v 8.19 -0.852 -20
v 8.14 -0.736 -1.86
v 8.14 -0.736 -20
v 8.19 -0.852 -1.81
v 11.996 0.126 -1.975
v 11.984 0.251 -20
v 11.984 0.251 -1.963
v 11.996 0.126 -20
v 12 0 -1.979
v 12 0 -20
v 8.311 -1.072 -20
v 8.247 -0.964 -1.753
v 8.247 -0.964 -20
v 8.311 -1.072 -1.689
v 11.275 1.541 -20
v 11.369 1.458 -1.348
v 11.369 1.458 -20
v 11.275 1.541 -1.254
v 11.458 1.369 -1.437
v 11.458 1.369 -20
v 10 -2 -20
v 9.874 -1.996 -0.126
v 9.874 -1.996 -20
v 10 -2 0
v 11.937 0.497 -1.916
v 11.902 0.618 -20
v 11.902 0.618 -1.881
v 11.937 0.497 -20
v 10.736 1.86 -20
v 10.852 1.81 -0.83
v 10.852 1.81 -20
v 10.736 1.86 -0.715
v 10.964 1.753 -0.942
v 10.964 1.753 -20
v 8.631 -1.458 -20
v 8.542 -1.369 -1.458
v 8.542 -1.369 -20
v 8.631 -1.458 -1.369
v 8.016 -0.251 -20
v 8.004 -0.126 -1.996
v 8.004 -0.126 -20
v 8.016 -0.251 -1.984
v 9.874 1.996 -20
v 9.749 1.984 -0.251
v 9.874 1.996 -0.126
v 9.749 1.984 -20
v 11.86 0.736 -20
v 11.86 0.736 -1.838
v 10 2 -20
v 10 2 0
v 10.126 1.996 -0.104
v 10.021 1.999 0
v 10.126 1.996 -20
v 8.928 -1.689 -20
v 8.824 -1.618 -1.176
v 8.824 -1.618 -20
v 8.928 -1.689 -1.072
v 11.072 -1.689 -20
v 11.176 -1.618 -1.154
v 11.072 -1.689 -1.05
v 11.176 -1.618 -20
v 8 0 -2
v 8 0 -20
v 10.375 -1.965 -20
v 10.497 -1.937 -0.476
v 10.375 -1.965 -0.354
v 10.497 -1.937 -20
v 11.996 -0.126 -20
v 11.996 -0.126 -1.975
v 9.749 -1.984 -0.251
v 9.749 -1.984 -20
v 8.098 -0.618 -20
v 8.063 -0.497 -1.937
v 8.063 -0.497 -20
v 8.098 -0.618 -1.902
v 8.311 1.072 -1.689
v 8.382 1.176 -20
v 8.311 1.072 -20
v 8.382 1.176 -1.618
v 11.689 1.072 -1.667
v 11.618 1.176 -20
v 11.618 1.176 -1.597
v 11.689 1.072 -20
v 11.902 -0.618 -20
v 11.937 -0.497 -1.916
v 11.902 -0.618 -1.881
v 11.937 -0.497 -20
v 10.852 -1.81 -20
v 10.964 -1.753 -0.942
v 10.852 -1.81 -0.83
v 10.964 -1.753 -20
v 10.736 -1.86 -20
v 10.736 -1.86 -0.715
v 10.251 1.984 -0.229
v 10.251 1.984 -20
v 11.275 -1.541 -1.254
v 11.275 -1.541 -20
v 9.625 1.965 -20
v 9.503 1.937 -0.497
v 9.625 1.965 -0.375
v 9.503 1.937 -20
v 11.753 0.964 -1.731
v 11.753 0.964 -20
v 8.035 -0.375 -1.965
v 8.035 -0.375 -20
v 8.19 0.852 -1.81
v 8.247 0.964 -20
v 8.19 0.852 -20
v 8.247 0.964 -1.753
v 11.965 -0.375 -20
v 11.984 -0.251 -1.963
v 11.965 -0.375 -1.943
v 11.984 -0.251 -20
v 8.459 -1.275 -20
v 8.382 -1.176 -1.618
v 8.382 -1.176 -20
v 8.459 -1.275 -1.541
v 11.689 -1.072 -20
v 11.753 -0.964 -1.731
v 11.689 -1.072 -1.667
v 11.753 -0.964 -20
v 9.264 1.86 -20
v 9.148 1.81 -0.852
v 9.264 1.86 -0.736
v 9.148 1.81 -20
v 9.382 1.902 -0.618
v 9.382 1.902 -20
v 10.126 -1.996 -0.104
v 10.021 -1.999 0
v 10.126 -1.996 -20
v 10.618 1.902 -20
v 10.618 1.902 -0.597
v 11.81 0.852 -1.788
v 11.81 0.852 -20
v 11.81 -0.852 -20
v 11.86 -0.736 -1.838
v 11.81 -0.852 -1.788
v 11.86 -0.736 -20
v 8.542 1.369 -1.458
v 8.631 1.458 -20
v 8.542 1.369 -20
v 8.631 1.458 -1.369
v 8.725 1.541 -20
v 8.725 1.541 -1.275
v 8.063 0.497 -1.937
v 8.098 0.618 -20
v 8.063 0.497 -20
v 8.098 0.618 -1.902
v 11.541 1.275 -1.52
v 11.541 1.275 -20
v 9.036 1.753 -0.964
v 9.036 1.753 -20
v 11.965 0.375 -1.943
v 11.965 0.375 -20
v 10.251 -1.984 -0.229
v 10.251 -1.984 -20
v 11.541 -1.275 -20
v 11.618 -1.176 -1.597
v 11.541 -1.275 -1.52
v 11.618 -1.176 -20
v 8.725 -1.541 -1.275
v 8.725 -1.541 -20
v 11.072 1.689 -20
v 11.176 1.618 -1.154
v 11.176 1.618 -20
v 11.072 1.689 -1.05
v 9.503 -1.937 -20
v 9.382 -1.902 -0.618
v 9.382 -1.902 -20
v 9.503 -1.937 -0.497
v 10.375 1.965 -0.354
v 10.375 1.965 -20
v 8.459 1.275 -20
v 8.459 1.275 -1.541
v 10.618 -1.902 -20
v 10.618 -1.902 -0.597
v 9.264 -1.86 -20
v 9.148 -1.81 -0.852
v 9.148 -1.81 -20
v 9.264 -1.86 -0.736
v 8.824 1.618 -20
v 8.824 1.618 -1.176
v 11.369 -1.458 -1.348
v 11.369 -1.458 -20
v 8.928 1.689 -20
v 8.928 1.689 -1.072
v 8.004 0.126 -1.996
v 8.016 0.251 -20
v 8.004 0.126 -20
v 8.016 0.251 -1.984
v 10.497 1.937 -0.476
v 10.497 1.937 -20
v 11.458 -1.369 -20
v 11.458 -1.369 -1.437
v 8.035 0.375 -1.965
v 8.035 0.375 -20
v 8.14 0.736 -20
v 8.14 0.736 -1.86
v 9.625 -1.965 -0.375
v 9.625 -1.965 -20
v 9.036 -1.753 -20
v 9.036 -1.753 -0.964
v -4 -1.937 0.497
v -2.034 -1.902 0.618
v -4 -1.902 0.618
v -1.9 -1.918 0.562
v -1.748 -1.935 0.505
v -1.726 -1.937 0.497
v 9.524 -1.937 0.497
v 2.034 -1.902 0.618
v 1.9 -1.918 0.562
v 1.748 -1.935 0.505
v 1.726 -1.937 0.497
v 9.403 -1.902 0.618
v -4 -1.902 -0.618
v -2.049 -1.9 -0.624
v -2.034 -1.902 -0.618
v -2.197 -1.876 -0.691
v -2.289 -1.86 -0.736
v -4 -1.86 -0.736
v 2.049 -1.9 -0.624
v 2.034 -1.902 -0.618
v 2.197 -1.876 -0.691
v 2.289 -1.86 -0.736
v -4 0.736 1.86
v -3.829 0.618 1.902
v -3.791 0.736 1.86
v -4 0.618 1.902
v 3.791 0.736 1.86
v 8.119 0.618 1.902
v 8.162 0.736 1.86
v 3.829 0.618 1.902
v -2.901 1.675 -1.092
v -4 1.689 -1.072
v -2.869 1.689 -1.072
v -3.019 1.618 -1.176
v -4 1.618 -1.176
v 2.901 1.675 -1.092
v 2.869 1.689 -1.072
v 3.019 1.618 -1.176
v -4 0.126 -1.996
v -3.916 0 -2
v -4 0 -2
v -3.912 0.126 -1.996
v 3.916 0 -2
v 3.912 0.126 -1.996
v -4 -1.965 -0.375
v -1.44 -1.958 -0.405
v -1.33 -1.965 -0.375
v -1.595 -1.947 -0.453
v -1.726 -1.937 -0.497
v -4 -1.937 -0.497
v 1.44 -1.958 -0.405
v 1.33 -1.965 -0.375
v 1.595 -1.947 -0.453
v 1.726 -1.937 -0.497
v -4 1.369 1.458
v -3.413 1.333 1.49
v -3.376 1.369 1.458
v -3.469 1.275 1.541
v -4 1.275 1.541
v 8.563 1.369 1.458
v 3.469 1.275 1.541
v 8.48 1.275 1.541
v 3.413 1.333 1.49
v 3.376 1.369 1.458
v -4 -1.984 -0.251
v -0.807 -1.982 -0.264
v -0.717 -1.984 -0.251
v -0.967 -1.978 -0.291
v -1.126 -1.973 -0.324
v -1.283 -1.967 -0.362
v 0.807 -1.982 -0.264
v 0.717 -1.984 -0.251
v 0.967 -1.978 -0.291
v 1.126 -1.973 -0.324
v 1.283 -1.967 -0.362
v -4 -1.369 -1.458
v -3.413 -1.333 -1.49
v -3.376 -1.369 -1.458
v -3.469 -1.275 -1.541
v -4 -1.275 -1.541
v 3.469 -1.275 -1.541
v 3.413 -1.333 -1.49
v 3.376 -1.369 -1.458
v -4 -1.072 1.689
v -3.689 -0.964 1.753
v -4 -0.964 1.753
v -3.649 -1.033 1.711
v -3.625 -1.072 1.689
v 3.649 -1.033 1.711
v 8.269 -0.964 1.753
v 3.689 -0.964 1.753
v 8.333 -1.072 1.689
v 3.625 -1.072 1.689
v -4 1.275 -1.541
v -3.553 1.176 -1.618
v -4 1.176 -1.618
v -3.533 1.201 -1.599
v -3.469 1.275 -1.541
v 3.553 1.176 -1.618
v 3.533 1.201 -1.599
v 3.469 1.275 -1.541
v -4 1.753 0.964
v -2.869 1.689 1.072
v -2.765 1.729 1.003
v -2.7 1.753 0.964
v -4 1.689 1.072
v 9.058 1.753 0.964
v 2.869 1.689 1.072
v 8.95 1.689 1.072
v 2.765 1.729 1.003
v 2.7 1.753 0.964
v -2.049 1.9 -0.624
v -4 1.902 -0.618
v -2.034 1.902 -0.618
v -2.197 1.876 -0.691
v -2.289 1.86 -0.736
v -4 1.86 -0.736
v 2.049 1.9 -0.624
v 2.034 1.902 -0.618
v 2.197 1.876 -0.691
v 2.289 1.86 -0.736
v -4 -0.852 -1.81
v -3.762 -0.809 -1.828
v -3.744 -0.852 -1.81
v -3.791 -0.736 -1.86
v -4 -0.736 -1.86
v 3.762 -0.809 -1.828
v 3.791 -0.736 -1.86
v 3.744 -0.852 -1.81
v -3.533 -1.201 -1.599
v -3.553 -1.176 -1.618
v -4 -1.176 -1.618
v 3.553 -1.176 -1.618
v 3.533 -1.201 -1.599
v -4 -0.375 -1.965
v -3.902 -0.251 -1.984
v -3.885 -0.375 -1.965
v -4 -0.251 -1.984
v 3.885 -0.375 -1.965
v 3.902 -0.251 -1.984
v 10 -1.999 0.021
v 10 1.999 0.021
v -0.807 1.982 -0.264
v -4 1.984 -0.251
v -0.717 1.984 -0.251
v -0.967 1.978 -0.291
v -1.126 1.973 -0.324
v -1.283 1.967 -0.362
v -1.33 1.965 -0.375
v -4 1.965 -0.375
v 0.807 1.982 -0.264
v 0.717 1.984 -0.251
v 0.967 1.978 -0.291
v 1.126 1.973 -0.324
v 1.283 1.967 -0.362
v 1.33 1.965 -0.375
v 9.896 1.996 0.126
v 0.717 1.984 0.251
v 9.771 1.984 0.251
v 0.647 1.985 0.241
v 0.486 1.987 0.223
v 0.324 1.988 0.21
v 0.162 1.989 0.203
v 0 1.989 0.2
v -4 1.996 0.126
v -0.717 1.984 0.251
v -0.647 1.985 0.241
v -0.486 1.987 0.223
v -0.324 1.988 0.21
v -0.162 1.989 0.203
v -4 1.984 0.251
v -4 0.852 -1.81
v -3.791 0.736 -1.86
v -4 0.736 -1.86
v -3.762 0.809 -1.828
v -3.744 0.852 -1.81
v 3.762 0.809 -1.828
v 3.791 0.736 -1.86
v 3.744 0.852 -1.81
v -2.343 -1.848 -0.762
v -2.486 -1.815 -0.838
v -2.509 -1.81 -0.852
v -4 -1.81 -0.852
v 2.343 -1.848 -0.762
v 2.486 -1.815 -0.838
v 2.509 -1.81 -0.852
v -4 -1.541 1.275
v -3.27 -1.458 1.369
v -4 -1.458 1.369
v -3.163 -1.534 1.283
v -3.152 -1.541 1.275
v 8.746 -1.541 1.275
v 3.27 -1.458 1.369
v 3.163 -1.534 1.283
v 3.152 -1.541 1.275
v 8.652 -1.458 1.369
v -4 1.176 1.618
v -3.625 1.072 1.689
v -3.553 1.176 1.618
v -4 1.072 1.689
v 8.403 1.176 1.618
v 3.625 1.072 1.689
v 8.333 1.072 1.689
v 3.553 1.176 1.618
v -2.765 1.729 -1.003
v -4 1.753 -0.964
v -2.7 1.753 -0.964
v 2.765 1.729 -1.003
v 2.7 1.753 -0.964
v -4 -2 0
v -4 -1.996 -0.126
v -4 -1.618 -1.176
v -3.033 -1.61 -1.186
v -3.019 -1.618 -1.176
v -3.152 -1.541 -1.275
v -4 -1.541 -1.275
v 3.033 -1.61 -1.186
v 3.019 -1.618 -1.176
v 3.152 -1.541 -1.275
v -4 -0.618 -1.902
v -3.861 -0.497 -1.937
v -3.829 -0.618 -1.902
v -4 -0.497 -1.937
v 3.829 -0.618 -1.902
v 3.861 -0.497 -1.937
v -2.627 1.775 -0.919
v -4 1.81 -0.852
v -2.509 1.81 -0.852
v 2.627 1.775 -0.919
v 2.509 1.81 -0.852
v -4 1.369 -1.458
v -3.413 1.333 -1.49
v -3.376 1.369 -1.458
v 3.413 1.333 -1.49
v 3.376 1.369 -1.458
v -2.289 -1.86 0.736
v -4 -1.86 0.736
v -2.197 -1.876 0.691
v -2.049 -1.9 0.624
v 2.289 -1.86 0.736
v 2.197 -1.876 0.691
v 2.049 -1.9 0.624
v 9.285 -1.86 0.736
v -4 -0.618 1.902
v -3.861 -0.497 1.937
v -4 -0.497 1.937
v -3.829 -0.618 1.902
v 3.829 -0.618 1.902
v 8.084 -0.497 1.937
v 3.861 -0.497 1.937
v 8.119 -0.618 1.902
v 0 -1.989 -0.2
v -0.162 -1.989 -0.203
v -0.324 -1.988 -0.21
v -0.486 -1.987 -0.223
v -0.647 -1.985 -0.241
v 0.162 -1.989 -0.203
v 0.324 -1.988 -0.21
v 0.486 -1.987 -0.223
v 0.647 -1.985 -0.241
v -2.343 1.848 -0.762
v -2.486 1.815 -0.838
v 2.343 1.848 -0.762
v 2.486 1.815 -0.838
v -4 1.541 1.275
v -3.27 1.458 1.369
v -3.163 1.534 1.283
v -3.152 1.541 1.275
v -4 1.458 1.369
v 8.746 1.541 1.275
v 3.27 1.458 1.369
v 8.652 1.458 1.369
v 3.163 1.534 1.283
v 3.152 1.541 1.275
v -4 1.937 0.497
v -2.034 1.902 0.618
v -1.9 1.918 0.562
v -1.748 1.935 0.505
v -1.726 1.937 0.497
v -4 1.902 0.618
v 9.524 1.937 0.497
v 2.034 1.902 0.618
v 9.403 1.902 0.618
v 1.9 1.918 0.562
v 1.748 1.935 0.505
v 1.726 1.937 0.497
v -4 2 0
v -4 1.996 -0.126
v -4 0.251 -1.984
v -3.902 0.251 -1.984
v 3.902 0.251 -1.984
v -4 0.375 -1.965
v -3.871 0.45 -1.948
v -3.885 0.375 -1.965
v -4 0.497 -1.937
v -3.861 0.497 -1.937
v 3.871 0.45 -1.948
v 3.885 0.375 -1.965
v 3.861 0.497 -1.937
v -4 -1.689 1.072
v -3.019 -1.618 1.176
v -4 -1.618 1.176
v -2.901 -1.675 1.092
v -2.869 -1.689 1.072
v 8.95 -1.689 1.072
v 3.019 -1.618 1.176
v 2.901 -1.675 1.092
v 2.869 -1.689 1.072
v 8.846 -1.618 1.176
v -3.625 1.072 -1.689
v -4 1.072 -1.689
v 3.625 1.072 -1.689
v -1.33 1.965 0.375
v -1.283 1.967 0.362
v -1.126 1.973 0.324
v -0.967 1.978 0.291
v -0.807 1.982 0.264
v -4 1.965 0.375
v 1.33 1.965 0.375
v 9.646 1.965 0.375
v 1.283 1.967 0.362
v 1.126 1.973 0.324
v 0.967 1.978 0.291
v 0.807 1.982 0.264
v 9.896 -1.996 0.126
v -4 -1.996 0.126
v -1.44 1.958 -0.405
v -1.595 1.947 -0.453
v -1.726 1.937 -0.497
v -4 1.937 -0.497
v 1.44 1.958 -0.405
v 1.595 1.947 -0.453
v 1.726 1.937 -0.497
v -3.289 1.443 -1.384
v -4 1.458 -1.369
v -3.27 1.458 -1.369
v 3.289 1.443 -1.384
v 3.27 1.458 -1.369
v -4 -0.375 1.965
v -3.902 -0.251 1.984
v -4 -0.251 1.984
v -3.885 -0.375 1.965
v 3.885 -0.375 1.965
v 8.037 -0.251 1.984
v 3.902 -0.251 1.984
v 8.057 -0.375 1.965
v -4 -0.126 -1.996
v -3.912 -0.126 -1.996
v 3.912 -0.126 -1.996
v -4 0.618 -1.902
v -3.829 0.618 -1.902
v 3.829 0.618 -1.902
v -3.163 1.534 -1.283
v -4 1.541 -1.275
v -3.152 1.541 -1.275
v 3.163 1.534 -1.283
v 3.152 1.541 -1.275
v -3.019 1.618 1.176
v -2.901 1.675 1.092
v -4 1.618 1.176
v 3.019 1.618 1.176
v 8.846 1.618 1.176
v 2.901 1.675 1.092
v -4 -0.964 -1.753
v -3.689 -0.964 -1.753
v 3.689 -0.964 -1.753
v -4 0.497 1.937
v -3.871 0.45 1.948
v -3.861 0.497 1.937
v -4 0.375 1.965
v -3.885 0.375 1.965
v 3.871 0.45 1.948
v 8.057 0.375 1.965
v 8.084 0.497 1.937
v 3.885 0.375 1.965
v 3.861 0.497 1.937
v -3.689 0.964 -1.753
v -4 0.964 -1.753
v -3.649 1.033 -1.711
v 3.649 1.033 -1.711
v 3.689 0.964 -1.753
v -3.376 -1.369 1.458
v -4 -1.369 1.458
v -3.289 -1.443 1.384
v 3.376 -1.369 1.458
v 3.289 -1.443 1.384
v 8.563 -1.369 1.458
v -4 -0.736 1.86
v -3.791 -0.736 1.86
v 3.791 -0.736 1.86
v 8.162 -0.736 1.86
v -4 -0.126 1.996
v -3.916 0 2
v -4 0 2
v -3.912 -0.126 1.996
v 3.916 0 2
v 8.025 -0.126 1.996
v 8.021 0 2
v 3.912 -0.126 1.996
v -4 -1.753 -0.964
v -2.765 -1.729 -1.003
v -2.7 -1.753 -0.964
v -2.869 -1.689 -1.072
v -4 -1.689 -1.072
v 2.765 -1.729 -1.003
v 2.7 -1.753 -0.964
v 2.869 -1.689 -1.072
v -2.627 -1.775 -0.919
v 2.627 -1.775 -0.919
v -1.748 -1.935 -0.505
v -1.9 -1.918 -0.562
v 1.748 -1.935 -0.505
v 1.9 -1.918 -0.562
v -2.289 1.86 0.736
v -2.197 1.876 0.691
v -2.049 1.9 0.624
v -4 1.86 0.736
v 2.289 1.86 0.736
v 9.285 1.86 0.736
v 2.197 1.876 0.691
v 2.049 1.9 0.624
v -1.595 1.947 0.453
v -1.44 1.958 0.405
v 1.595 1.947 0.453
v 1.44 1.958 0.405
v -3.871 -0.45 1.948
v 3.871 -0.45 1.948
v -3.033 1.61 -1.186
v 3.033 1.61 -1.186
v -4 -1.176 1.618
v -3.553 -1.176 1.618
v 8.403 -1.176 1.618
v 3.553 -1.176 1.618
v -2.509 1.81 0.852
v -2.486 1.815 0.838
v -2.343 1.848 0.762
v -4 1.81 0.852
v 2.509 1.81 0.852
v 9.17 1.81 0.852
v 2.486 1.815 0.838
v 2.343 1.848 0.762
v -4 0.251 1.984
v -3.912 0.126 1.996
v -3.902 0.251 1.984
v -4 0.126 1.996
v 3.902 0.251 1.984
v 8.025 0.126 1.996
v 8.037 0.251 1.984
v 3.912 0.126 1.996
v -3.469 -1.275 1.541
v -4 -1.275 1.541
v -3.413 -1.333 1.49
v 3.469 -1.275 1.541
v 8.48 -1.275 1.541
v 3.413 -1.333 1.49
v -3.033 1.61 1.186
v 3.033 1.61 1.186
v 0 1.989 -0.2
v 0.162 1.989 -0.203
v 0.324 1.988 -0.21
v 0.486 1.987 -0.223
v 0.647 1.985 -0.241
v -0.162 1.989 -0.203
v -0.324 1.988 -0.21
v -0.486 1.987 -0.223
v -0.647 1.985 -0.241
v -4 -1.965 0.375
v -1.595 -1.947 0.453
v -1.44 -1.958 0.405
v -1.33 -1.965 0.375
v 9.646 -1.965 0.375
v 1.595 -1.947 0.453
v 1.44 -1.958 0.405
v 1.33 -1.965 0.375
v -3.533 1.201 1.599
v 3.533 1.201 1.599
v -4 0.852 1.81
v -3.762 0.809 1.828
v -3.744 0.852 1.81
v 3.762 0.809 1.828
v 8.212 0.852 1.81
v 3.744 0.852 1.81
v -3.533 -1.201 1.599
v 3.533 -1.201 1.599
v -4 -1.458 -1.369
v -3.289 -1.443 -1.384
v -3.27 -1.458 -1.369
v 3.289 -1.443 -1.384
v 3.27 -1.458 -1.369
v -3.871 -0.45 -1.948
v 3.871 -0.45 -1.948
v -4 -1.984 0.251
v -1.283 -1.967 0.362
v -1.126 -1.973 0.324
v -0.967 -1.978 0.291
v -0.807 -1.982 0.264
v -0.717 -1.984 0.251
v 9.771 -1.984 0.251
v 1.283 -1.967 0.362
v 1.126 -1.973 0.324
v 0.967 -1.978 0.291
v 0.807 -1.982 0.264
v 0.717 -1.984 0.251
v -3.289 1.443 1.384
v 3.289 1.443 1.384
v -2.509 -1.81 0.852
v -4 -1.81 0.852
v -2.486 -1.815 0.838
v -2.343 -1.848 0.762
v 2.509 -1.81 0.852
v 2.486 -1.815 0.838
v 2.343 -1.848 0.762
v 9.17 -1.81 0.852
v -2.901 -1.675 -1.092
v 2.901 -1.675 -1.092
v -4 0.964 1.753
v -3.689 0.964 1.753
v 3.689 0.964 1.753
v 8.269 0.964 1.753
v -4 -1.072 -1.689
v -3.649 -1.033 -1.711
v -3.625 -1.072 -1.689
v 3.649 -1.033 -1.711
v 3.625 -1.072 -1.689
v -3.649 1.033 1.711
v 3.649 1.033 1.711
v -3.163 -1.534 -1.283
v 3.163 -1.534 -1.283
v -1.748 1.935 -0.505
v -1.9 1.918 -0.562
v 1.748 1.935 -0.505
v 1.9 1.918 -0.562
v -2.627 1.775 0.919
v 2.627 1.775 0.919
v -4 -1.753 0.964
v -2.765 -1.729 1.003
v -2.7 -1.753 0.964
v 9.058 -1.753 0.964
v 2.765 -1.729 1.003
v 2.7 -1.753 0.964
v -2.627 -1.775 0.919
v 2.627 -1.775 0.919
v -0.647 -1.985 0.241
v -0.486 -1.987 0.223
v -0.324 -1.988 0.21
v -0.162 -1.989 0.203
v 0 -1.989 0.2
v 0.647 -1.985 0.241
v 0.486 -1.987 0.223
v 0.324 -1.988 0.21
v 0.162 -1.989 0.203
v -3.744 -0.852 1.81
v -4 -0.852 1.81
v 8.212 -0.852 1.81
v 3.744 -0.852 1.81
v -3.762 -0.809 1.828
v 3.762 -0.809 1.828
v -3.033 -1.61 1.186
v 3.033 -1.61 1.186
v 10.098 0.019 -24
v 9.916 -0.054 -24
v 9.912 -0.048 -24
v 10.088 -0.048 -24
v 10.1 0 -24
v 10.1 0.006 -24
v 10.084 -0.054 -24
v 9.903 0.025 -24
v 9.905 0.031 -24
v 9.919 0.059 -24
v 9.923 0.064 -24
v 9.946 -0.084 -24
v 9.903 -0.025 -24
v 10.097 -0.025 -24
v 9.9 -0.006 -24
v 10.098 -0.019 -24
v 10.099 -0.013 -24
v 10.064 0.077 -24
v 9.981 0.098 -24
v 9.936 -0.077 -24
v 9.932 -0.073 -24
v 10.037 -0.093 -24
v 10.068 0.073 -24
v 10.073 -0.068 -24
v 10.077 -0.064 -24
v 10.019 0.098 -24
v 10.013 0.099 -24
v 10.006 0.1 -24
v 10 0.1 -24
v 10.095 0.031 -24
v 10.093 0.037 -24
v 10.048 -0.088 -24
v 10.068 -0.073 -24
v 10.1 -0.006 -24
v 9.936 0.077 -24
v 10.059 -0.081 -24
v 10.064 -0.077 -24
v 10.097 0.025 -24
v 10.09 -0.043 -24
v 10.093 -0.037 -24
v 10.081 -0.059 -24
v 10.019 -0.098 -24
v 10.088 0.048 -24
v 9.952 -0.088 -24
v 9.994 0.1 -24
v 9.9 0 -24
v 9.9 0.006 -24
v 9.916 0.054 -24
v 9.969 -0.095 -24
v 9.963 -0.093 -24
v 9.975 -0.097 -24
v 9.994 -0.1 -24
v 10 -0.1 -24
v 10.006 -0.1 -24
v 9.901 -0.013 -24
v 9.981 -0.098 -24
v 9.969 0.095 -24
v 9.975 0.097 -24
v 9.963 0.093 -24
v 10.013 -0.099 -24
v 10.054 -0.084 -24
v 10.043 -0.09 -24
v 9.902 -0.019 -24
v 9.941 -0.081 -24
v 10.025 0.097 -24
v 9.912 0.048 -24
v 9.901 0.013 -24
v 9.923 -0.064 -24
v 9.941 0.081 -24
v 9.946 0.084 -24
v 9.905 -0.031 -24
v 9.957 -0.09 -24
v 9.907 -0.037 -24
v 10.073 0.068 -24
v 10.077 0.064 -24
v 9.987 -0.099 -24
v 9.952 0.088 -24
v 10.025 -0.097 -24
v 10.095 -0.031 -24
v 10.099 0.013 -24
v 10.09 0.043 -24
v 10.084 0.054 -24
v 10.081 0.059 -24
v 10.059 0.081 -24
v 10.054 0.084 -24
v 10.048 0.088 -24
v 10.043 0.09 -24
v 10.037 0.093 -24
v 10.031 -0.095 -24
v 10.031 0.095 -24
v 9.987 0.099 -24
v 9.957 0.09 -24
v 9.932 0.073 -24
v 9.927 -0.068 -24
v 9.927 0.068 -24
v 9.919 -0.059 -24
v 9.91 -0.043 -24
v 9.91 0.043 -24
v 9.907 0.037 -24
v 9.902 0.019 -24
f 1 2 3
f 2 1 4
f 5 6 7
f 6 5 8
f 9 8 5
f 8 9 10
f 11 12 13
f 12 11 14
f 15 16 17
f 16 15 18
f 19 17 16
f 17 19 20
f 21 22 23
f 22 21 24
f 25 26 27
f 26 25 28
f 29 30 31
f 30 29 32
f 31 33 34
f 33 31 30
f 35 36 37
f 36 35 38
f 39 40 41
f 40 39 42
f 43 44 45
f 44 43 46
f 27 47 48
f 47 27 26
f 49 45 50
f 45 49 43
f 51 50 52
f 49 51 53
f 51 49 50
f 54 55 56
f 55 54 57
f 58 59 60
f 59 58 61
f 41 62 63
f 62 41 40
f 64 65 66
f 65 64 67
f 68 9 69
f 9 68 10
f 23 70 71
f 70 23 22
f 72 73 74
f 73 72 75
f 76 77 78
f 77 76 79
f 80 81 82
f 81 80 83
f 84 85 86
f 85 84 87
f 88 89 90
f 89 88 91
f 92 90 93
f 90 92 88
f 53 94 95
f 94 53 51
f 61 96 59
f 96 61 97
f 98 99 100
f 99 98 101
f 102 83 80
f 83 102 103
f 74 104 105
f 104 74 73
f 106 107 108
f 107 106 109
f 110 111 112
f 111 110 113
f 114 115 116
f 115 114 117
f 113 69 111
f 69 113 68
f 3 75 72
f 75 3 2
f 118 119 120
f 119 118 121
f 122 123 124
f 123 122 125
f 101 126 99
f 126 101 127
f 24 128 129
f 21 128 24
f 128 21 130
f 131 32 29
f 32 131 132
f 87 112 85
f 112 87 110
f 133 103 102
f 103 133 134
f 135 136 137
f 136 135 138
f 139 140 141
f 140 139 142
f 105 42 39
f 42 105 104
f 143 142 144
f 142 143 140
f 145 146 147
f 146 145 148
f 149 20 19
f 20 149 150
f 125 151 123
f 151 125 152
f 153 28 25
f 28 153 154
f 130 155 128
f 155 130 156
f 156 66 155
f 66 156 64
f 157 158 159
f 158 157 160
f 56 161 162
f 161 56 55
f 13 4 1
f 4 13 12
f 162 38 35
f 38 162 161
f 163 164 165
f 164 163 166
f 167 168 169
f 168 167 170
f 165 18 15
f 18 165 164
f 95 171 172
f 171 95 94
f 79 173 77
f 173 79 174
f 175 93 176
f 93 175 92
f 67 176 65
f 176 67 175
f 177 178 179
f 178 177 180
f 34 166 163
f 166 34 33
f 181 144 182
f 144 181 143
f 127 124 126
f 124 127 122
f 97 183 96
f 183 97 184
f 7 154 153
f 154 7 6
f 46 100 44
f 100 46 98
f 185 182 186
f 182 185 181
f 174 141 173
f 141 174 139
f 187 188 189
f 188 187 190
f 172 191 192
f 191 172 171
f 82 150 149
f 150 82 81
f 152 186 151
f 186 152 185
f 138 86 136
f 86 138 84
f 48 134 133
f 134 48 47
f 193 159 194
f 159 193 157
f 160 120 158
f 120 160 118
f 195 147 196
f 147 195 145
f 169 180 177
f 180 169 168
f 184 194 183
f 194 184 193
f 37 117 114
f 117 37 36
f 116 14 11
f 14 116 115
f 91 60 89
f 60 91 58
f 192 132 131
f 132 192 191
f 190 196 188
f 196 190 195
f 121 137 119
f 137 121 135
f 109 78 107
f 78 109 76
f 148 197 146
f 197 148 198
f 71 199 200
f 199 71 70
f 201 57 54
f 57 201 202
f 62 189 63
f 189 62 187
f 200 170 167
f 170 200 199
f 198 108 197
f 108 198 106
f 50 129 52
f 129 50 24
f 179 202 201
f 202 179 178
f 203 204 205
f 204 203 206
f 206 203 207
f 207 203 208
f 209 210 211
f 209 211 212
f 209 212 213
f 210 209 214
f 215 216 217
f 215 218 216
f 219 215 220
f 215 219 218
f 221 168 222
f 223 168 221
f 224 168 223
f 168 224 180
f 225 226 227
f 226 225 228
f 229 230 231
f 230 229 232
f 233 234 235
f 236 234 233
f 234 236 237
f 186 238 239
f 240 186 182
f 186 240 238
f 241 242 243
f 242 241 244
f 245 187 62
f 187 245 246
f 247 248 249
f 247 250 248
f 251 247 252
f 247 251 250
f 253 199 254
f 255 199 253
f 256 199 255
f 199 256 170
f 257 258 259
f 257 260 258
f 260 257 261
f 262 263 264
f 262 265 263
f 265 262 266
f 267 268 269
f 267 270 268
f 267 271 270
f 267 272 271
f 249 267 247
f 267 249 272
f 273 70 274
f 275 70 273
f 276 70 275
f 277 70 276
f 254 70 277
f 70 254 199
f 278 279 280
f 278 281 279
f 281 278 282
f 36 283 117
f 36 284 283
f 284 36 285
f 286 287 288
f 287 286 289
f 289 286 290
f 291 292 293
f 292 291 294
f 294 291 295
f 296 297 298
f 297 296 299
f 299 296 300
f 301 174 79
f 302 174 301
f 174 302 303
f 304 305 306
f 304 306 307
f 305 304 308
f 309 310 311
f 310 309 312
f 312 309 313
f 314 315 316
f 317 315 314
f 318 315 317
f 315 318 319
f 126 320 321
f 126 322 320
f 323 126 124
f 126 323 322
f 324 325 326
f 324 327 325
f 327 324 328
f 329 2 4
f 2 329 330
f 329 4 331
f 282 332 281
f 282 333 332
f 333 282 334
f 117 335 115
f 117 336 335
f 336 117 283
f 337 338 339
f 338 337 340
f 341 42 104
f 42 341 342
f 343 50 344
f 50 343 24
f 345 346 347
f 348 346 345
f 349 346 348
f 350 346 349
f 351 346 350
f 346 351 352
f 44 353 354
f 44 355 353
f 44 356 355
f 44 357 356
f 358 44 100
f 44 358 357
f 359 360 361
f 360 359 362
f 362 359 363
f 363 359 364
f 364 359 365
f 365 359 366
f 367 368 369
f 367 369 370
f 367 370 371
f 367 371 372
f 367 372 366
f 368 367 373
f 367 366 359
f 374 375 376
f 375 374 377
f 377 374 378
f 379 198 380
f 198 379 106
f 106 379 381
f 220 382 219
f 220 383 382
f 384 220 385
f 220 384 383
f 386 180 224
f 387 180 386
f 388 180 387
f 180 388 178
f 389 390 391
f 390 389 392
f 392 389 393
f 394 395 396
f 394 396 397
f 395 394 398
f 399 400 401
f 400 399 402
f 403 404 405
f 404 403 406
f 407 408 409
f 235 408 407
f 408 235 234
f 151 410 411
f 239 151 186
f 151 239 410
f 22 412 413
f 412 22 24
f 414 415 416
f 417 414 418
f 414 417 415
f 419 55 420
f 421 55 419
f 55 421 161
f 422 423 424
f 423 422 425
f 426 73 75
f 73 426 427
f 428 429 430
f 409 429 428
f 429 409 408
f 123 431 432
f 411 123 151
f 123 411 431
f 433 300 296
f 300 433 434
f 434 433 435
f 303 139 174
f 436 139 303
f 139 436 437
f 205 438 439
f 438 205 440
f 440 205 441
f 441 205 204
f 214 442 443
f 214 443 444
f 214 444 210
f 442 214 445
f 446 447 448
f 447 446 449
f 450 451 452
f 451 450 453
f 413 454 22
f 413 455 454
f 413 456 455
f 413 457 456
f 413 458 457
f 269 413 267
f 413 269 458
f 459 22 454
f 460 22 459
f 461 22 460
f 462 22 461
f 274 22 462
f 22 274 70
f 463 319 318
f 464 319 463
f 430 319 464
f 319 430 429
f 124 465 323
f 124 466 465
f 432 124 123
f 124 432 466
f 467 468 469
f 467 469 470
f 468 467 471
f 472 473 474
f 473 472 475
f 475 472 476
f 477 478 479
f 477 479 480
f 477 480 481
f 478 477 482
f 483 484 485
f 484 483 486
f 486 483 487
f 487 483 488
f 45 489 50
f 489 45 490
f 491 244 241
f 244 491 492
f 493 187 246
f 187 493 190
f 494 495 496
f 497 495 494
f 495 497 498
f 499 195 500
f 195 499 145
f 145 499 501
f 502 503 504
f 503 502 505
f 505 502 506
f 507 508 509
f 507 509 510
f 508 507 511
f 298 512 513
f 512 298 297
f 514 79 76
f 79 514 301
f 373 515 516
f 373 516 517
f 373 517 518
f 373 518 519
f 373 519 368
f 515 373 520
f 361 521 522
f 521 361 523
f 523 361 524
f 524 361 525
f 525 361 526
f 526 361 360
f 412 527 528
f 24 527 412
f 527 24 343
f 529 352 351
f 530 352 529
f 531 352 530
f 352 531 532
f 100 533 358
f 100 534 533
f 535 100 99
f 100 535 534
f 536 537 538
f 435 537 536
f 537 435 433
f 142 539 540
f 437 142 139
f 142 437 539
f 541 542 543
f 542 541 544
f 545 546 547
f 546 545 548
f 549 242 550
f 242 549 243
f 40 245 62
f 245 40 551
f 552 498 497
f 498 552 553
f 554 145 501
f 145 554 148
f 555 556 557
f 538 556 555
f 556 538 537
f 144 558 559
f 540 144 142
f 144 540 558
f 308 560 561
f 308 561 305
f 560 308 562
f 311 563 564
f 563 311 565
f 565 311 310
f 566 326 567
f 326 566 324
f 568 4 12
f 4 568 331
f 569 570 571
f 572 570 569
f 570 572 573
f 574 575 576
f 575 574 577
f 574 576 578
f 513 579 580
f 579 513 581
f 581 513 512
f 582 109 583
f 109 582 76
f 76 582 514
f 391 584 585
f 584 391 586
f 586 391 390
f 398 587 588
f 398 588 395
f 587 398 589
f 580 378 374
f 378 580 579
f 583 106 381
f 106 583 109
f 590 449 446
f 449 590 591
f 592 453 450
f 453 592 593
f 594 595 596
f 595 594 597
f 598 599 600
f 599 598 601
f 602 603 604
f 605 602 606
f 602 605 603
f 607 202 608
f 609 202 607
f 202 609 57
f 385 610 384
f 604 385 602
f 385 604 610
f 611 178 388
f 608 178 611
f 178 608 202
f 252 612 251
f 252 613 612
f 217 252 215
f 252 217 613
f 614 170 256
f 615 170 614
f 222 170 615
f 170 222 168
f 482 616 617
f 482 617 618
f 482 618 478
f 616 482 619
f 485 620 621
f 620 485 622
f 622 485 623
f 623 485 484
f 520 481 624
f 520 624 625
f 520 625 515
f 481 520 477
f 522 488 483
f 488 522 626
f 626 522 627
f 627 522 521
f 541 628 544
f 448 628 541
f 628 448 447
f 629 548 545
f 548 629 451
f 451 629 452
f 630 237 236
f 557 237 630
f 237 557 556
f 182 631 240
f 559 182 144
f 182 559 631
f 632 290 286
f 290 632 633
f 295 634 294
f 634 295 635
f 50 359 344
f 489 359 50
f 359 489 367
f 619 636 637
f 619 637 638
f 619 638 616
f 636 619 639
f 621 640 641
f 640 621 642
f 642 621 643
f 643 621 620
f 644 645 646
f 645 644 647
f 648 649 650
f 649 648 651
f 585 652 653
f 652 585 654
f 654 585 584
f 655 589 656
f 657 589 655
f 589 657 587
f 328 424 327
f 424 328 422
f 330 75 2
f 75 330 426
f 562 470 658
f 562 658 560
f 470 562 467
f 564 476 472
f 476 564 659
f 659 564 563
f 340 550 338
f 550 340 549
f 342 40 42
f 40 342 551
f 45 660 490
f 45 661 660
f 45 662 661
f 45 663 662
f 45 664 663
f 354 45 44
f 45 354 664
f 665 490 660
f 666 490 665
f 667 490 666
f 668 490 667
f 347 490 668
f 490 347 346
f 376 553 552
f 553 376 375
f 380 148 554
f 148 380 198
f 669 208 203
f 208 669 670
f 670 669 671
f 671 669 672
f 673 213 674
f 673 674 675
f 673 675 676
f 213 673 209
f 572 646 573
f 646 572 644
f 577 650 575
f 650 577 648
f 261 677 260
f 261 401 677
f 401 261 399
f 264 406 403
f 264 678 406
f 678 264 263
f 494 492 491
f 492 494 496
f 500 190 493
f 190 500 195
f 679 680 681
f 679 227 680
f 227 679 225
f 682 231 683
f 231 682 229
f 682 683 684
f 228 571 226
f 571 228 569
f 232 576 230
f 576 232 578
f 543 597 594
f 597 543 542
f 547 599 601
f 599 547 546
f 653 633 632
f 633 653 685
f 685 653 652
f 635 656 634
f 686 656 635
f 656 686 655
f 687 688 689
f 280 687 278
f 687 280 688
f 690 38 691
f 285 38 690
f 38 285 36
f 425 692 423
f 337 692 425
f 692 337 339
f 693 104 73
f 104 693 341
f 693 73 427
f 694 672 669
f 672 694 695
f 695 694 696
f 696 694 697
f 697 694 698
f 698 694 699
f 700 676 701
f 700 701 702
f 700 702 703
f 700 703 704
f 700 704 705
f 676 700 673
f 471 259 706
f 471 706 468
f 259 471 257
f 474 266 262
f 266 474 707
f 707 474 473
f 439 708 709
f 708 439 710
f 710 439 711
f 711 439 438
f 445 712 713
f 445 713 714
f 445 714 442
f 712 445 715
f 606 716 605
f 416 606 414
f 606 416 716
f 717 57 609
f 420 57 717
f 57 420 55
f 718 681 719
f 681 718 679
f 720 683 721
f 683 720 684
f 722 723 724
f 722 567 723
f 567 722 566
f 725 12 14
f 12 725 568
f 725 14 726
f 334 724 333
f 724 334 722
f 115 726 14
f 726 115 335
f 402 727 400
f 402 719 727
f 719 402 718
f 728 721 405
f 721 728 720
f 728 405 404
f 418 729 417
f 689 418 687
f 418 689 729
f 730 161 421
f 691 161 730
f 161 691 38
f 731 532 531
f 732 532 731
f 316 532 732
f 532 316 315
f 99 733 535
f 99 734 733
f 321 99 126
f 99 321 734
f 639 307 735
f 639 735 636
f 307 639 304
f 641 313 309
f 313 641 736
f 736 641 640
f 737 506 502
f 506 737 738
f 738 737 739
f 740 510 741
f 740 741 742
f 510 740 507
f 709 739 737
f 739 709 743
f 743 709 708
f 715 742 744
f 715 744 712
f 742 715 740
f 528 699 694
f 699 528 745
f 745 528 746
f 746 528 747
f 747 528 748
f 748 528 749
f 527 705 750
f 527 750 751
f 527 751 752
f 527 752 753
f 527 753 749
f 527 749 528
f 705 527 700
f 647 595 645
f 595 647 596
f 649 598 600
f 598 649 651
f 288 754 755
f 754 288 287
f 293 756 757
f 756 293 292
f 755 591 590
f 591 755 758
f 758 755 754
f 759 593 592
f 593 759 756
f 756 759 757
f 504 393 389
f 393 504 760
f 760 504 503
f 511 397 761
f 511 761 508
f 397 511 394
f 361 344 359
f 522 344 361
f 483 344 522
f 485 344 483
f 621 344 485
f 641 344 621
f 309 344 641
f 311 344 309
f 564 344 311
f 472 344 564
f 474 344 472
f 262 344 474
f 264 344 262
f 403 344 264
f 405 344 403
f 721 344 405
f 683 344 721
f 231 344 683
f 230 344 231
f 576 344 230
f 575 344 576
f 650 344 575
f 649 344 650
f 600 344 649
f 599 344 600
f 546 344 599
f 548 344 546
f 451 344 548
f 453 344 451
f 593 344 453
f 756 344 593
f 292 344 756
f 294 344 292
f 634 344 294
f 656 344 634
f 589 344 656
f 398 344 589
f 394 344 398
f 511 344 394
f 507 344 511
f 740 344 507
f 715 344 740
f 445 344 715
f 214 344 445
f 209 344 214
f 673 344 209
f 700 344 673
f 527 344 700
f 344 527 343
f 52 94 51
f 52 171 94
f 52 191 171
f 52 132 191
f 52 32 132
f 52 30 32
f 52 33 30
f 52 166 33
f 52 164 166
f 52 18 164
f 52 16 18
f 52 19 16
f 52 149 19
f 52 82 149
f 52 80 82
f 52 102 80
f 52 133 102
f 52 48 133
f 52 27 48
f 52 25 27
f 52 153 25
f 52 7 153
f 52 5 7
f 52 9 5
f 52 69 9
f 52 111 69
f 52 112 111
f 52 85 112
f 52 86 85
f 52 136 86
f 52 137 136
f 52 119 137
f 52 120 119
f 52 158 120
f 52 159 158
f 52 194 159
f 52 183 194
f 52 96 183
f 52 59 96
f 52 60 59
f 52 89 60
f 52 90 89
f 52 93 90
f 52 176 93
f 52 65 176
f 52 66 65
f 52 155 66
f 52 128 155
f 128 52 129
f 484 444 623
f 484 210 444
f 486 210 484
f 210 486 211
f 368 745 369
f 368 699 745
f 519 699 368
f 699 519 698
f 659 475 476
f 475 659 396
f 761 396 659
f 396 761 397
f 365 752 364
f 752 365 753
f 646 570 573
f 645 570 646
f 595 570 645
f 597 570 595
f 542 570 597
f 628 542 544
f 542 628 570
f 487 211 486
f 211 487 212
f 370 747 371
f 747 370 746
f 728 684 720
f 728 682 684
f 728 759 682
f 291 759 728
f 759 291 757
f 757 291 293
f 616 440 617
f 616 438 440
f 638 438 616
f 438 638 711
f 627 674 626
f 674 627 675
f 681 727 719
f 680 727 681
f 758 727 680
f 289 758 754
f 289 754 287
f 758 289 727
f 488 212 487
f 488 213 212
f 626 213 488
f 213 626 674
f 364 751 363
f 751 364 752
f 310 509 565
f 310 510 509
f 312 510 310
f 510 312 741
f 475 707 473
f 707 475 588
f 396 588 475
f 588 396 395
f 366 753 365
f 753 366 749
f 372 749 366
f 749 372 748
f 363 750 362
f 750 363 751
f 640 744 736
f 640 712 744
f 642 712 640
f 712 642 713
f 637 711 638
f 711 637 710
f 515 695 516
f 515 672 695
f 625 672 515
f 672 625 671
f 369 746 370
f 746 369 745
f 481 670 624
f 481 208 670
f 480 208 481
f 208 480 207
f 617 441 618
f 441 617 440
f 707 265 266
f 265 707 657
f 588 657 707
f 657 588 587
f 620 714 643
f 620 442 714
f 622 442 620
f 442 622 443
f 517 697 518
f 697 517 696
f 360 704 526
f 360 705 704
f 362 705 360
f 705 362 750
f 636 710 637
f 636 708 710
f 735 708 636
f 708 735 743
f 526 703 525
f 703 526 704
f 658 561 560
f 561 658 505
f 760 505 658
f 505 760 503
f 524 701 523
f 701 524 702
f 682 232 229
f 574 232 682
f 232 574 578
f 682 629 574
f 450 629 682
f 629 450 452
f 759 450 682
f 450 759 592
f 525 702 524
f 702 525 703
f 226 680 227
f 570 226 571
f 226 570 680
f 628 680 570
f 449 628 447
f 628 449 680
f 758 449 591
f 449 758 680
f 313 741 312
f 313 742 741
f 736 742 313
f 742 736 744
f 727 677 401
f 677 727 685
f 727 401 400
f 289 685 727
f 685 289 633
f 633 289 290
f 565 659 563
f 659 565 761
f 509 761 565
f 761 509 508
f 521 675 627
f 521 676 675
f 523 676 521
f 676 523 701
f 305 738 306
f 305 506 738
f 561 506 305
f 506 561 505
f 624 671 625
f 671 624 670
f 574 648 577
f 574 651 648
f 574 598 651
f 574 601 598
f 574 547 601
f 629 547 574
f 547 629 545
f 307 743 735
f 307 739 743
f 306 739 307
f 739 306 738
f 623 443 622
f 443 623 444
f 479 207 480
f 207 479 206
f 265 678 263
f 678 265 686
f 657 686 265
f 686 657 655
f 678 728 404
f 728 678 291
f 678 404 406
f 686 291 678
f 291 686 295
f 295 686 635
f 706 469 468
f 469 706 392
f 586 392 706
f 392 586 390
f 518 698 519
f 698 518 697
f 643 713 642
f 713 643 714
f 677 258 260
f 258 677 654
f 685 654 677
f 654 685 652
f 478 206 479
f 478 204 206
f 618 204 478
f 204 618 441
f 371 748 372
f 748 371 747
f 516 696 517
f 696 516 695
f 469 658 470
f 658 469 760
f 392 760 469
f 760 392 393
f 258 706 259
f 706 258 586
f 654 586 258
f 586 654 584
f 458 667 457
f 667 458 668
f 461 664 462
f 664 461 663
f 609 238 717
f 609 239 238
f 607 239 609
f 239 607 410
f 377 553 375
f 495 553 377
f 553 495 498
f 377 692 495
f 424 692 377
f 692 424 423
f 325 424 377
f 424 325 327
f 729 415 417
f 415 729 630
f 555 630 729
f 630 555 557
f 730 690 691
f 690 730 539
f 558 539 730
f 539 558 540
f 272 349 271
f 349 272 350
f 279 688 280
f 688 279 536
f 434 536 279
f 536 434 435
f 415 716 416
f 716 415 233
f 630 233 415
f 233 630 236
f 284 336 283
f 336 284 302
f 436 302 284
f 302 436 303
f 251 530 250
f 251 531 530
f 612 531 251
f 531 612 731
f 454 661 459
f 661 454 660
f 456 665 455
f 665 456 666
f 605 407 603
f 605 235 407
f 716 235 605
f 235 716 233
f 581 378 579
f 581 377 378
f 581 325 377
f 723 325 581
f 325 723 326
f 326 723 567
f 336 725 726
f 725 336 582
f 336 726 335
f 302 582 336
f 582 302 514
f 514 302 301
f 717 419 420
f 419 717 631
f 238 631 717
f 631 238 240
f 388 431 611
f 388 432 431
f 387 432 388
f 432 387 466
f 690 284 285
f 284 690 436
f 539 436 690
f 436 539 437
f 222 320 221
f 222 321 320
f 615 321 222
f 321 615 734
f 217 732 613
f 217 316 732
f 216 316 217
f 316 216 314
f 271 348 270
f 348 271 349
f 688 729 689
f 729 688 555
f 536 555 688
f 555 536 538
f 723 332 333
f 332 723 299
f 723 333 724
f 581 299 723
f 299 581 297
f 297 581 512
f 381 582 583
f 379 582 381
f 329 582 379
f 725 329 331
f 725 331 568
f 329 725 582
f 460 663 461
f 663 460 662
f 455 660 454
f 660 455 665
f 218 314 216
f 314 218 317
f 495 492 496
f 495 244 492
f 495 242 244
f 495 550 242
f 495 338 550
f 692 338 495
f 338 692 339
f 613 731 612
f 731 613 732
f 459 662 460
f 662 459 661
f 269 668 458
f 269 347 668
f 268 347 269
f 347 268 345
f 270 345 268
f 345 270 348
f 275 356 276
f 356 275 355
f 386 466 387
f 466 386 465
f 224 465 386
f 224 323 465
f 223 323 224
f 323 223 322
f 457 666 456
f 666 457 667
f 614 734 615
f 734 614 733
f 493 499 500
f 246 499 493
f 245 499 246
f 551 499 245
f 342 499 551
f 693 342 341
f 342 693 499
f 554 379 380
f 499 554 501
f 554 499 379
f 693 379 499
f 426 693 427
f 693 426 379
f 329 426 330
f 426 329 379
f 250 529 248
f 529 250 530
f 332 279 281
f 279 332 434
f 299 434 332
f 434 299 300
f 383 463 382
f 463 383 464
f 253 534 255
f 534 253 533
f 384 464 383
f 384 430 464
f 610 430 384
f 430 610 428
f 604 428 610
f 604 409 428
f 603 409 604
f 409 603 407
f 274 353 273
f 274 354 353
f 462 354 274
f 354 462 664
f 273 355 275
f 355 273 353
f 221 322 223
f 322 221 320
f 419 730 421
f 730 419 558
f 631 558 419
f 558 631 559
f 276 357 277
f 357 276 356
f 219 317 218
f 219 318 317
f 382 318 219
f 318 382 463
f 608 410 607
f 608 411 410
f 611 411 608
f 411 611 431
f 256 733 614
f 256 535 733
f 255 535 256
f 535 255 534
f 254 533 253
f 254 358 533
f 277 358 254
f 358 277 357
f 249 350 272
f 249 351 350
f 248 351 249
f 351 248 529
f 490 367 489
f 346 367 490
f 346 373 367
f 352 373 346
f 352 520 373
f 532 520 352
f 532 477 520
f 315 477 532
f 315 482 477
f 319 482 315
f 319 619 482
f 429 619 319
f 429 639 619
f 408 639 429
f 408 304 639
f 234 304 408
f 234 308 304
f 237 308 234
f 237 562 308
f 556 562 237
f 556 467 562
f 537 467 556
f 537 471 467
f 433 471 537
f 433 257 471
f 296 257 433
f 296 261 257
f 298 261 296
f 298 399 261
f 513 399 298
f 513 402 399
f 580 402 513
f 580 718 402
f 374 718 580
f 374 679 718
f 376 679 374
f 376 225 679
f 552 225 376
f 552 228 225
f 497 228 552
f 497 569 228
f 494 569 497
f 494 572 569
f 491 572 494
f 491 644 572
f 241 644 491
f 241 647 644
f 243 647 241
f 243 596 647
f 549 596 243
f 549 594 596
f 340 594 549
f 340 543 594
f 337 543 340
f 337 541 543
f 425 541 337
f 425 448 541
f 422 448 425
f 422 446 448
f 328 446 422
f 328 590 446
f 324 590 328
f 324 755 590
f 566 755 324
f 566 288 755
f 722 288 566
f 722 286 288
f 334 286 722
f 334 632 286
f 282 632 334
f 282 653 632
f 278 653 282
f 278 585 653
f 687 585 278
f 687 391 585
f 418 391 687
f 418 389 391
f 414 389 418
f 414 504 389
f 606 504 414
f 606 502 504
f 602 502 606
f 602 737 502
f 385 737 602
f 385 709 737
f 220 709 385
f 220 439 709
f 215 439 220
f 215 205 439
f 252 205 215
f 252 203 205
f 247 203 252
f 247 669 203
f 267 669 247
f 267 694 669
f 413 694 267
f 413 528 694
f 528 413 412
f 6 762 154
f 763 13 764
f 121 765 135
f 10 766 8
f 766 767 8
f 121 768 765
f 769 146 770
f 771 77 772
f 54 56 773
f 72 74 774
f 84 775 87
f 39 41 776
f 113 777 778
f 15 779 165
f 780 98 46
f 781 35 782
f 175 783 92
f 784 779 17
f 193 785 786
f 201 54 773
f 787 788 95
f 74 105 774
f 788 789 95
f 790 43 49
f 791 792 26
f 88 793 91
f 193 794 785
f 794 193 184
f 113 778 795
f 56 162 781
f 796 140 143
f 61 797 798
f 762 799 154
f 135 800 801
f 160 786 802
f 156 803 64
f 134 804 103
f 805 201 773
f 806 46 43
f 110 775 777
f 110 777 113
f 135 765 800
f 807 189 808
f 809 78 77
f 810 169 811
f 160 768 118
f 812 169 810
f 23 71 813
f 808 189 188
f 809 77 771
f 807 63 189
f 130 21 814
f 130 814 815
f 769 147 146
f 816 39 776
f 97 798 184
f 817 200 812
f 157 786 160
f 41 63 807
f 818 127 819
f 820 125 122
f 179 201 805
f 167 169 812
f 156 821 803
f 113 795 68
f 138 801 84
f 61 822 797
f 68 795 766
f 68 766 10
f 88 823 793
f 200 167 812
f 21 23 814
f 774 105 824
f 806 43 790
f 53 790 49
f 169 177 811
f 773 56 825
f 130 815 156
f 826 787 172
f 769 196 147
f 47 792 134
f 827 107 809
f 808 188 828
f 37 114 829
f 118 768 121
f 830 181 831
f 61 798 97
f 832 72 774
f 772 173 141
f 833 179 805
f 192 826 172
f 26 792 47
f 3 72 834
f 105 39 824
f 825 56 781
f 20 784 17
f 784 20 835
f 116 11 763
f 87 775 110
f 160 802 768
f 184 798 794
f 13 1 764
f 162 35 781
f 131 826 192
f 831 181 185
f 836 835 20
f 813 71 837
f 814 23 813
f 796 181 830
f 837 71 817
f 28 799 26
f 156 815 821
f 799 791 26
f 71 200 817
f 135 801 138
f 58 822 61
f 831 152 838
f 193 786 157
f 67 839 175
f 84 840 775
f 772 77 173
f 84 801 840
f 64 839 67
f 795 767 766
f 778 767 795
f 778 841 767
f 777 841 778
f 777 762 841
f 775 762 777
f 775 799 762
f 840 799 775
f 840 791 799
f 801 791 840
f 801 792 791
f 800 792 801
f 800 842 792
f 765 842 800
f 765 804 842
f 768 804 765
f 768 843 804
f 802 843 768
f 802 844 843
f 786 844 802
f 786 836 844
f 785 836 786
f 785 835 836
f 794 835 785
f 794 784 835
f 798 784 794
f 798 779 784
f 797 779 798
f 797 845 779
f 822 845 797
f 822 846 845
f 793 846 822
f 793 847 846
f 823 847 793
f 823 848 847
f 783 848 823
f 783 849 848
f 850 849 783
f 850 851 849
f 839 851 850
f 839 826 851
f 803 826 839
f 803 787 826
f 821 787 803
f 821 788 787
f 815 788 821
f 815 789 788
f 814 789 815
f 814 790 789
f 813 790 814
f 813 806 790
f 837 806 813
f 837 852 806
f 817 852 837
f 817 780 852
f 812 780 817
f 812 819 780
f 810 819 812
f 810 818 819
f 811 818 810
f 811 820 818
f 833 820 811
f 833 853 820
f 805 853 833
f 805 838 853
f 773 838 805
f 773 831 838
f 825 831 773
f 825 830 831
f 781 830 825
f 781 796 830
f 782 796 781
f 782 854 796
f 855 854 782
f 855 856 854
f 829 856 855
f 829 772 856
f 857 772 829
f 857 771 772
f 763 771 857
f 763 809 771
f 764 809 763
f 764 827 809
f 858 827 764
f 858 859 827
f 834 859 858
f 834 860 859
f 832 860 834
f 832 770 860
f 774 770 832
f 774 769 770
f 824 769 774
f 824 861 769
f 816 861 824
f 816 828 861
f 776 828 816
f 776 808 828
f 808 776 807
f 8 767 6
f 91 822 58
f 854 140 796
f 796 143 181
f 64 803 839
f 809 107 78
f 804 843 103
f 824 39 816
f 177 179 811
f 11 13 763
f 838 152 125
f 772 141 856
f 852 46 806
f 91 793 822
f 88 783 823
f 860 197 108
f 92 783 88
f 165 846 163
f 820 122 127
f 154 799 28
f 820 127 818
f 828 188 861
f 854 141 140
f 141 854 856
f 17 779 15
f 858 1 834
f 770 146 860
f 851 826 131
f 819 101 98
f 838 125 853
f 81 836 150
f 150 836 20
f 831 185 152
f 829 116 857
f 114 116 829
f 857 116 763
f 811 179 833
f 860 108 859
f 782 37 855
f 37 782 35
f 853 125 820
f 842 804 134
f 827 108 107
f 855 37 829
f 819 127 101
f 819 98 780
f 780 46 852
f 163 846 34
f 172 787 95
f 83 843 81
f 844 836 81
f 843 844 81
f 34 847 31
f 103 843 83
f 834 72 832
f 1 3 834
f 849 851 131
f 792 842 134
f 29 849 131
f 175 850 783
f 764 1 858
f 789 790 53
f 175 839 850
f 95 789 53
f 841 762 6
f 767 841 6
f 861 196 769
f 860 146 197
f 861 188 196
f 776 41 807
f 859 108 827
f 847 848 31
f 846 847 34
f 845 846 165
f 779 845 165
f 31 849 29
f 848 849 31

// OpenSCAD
// file: excitation_optics.scad
module collimation_lens
// radiospare P/N AC050-008-A-ML
// DESIGN WAVELENGTHS: 486.1nm, 587.6, AND 656.3nm
// FOCAL LENGTH: 7.5mm 1%
// BACK FOCAL LENGTH (REF): 5.2mm
// LENS DIAMETER: 5.0mm +0.00/-0.10mm
// LENS CENTER THICKNESS: 4.5mm
// CLEAR APERTURE: >90% OF LENS DIAMETER
// SURFACE QUALITY: 40-20 SCRATCH-DIG
// CENTRATION: ≤3 arcmin
// COATING: BBAR Ravg <0.5% FROM 400-700nm
// 0 AOI, ON BOTH OPTICAL SURFACES
(
    source_position=[0, 0, 0],
    phi_ext=9.2, //9.2,
    height_ext=6.4,
    back_focal_length=5.2,
)
{
    translate(source_position)
	translate([0, 0, back_focal_length])
	cylinder(r=phi_ext/2, h=height_ext, center=false, $fn=100);
}

module excitation_mirror
// thorlabs P/N MRA05-E02
(
    optical_center=[0, 0, 0],
    width=5,
    height=5,
    angle=45,
)
{
    color([0.5, 0.5, 0.5])
    translate(optical_center)
    {
	mirror([1, 0, 0])
	difference()
	{
	    cube(size=[width, width, width], center=true);
	    rotate([0, angle, 0]) translate([width*0.707, 0, 0])
	    cube(size=[width*1.42, width*1.42, width*1.42], center=true);
	}
    }
}

module cylindrical_lens
// thorlabs P/N LJ1918L1-A
// NOTES/SPECIFICATIONS:
// 1.DESIGN WAVELENGTH: 587.6nm
// 2.FOCAL LENGTH: f=5.79mm ± 1%
// 3.BACK FOCAL LENGTH(REF): bf=4.0mm
// 4.CLEAR APERTURE: >90% OF SURFACE LENGTH AND HEIGHT
// 5.SURFACE QUALITY: 60-40 SCRATCH-DIG
// 6.CENTRATION: ≤ 5arcmin
// 7.LENGTH AND HEIGHT TOLERANCE: +0.0/-0.1mm
// 8.THICKNESS TOLERANCE: ±0.1mm
// 9.SURFACE ACCURACY:
// POWER = 1 FRINGE (S1), 3 FRINGES (S2)
// IRREGULARITY = λ/4 (S1), λ (S2 H), λ/cm (S2 L)
// 10.COATING: BBAR Ravg<0.5% FROM 350nm-700nm,
//   0 AOI, ON OUTER OPTICAL SURFACES
(
    height=4.0,
    length=6.0,
    rect_thick=2.0,
    tot_thick=2.8,
    radius=3.0,
    back_focal_length=4.0,
)
{
    cyl_thick = tot_thick - rect_thick;
    color([0., 0., 0.3, 0.5])
    translate([back_focal_length, 0, 0])
    intersection()
    {
	translate([tot_thick/2, 0, 0])
	cube([tot_thick, length, height], center=true);
	translate([tot_thick-radius, 0, 0])
	{
	    rotate([90, 0, 0])
	    cylinder(r=radius, h=length, center=true, $fn=100);
	}
    }
}


module excitation_filter
// edmund optics P/N 48-632
(
    diameter=12,
    thickness=2.5
)
{
    color([0.1, 0.2, 0.8, 0.5])
    cylinder(r=diameter/2, h=thickness, $fn=100);
}
// main file
use <excitation_optics.scad>

// Excitation light path
module excitation_beam
(
    exc_waist = 4., // collimated beam waist
    col_lens_BFL=4., // colimation lens backfocal length
    excitation_source=[10, 0, -24], // position of the excitation source
    cyl_lens_BFL=4,
    mirror_center=[10, 0, 0]
)
{
    color([0.1, 0.4, 0.4, 0.15])
    {
	translate(excitation_source)
	cylinder(r1=0.1, r2=exc_waist/2, h=col_lens_BFL, $fn=100);

	difference()
	{
	    union()
	    {
		translate([excitation_source[0],
			excitation_source[1],
			excitation_source[2] + col_lens_BFL])
		cylinder(r=exc_waist/2,
	            h=-excitation_source[2]-col_lens_BFL, $fn=100);

		translate([cyl_lens_BFL, 0, 0])
		rotate([0, 90, 0])
		cylinder(r=exc_waist/2,
	            h=excitation_source[0]-cyl_lens_BFL, $fn=100);
	    }
	    excitation_mirror(optical_center=mirror_center);
	}
	light_sheet(w_0=0.2,
	    cyl_lens_BFL=cyl_lens_BFL,
	    w_oo=exc_waist);
    }
}
module light_sheet
(
    w_0=0.1,
    cyl_lens_BFL=4,
    w_oo=4,
)
{
    d = (w_oo - w_0)/2.;
    r = (d*d + cyl_lens_BFL*cyl_lens_BFL)/(2*d);
    difference()
    {
	translate([-cyl_lens_BFL, 0, 0 ])
	rotate([0, 90, 0])
	cylinder(r=w_oo/2, h=2*cyl_lens_BFL, $fn=100);
	union()	rotate([90, 0, 0])
	{
	    translate([0, r+w_0, -cyl_lens_BFL/2])
	    cylinder(r=r, h=w_oo+0.2, $fn=200);
	    translate([0, -r-w_0, -cyl_lens_BFL/2])
	    cylinder(r=r, h=w_oo+0.2, $fn=200);
	}
    }
}


excitation_beam();
